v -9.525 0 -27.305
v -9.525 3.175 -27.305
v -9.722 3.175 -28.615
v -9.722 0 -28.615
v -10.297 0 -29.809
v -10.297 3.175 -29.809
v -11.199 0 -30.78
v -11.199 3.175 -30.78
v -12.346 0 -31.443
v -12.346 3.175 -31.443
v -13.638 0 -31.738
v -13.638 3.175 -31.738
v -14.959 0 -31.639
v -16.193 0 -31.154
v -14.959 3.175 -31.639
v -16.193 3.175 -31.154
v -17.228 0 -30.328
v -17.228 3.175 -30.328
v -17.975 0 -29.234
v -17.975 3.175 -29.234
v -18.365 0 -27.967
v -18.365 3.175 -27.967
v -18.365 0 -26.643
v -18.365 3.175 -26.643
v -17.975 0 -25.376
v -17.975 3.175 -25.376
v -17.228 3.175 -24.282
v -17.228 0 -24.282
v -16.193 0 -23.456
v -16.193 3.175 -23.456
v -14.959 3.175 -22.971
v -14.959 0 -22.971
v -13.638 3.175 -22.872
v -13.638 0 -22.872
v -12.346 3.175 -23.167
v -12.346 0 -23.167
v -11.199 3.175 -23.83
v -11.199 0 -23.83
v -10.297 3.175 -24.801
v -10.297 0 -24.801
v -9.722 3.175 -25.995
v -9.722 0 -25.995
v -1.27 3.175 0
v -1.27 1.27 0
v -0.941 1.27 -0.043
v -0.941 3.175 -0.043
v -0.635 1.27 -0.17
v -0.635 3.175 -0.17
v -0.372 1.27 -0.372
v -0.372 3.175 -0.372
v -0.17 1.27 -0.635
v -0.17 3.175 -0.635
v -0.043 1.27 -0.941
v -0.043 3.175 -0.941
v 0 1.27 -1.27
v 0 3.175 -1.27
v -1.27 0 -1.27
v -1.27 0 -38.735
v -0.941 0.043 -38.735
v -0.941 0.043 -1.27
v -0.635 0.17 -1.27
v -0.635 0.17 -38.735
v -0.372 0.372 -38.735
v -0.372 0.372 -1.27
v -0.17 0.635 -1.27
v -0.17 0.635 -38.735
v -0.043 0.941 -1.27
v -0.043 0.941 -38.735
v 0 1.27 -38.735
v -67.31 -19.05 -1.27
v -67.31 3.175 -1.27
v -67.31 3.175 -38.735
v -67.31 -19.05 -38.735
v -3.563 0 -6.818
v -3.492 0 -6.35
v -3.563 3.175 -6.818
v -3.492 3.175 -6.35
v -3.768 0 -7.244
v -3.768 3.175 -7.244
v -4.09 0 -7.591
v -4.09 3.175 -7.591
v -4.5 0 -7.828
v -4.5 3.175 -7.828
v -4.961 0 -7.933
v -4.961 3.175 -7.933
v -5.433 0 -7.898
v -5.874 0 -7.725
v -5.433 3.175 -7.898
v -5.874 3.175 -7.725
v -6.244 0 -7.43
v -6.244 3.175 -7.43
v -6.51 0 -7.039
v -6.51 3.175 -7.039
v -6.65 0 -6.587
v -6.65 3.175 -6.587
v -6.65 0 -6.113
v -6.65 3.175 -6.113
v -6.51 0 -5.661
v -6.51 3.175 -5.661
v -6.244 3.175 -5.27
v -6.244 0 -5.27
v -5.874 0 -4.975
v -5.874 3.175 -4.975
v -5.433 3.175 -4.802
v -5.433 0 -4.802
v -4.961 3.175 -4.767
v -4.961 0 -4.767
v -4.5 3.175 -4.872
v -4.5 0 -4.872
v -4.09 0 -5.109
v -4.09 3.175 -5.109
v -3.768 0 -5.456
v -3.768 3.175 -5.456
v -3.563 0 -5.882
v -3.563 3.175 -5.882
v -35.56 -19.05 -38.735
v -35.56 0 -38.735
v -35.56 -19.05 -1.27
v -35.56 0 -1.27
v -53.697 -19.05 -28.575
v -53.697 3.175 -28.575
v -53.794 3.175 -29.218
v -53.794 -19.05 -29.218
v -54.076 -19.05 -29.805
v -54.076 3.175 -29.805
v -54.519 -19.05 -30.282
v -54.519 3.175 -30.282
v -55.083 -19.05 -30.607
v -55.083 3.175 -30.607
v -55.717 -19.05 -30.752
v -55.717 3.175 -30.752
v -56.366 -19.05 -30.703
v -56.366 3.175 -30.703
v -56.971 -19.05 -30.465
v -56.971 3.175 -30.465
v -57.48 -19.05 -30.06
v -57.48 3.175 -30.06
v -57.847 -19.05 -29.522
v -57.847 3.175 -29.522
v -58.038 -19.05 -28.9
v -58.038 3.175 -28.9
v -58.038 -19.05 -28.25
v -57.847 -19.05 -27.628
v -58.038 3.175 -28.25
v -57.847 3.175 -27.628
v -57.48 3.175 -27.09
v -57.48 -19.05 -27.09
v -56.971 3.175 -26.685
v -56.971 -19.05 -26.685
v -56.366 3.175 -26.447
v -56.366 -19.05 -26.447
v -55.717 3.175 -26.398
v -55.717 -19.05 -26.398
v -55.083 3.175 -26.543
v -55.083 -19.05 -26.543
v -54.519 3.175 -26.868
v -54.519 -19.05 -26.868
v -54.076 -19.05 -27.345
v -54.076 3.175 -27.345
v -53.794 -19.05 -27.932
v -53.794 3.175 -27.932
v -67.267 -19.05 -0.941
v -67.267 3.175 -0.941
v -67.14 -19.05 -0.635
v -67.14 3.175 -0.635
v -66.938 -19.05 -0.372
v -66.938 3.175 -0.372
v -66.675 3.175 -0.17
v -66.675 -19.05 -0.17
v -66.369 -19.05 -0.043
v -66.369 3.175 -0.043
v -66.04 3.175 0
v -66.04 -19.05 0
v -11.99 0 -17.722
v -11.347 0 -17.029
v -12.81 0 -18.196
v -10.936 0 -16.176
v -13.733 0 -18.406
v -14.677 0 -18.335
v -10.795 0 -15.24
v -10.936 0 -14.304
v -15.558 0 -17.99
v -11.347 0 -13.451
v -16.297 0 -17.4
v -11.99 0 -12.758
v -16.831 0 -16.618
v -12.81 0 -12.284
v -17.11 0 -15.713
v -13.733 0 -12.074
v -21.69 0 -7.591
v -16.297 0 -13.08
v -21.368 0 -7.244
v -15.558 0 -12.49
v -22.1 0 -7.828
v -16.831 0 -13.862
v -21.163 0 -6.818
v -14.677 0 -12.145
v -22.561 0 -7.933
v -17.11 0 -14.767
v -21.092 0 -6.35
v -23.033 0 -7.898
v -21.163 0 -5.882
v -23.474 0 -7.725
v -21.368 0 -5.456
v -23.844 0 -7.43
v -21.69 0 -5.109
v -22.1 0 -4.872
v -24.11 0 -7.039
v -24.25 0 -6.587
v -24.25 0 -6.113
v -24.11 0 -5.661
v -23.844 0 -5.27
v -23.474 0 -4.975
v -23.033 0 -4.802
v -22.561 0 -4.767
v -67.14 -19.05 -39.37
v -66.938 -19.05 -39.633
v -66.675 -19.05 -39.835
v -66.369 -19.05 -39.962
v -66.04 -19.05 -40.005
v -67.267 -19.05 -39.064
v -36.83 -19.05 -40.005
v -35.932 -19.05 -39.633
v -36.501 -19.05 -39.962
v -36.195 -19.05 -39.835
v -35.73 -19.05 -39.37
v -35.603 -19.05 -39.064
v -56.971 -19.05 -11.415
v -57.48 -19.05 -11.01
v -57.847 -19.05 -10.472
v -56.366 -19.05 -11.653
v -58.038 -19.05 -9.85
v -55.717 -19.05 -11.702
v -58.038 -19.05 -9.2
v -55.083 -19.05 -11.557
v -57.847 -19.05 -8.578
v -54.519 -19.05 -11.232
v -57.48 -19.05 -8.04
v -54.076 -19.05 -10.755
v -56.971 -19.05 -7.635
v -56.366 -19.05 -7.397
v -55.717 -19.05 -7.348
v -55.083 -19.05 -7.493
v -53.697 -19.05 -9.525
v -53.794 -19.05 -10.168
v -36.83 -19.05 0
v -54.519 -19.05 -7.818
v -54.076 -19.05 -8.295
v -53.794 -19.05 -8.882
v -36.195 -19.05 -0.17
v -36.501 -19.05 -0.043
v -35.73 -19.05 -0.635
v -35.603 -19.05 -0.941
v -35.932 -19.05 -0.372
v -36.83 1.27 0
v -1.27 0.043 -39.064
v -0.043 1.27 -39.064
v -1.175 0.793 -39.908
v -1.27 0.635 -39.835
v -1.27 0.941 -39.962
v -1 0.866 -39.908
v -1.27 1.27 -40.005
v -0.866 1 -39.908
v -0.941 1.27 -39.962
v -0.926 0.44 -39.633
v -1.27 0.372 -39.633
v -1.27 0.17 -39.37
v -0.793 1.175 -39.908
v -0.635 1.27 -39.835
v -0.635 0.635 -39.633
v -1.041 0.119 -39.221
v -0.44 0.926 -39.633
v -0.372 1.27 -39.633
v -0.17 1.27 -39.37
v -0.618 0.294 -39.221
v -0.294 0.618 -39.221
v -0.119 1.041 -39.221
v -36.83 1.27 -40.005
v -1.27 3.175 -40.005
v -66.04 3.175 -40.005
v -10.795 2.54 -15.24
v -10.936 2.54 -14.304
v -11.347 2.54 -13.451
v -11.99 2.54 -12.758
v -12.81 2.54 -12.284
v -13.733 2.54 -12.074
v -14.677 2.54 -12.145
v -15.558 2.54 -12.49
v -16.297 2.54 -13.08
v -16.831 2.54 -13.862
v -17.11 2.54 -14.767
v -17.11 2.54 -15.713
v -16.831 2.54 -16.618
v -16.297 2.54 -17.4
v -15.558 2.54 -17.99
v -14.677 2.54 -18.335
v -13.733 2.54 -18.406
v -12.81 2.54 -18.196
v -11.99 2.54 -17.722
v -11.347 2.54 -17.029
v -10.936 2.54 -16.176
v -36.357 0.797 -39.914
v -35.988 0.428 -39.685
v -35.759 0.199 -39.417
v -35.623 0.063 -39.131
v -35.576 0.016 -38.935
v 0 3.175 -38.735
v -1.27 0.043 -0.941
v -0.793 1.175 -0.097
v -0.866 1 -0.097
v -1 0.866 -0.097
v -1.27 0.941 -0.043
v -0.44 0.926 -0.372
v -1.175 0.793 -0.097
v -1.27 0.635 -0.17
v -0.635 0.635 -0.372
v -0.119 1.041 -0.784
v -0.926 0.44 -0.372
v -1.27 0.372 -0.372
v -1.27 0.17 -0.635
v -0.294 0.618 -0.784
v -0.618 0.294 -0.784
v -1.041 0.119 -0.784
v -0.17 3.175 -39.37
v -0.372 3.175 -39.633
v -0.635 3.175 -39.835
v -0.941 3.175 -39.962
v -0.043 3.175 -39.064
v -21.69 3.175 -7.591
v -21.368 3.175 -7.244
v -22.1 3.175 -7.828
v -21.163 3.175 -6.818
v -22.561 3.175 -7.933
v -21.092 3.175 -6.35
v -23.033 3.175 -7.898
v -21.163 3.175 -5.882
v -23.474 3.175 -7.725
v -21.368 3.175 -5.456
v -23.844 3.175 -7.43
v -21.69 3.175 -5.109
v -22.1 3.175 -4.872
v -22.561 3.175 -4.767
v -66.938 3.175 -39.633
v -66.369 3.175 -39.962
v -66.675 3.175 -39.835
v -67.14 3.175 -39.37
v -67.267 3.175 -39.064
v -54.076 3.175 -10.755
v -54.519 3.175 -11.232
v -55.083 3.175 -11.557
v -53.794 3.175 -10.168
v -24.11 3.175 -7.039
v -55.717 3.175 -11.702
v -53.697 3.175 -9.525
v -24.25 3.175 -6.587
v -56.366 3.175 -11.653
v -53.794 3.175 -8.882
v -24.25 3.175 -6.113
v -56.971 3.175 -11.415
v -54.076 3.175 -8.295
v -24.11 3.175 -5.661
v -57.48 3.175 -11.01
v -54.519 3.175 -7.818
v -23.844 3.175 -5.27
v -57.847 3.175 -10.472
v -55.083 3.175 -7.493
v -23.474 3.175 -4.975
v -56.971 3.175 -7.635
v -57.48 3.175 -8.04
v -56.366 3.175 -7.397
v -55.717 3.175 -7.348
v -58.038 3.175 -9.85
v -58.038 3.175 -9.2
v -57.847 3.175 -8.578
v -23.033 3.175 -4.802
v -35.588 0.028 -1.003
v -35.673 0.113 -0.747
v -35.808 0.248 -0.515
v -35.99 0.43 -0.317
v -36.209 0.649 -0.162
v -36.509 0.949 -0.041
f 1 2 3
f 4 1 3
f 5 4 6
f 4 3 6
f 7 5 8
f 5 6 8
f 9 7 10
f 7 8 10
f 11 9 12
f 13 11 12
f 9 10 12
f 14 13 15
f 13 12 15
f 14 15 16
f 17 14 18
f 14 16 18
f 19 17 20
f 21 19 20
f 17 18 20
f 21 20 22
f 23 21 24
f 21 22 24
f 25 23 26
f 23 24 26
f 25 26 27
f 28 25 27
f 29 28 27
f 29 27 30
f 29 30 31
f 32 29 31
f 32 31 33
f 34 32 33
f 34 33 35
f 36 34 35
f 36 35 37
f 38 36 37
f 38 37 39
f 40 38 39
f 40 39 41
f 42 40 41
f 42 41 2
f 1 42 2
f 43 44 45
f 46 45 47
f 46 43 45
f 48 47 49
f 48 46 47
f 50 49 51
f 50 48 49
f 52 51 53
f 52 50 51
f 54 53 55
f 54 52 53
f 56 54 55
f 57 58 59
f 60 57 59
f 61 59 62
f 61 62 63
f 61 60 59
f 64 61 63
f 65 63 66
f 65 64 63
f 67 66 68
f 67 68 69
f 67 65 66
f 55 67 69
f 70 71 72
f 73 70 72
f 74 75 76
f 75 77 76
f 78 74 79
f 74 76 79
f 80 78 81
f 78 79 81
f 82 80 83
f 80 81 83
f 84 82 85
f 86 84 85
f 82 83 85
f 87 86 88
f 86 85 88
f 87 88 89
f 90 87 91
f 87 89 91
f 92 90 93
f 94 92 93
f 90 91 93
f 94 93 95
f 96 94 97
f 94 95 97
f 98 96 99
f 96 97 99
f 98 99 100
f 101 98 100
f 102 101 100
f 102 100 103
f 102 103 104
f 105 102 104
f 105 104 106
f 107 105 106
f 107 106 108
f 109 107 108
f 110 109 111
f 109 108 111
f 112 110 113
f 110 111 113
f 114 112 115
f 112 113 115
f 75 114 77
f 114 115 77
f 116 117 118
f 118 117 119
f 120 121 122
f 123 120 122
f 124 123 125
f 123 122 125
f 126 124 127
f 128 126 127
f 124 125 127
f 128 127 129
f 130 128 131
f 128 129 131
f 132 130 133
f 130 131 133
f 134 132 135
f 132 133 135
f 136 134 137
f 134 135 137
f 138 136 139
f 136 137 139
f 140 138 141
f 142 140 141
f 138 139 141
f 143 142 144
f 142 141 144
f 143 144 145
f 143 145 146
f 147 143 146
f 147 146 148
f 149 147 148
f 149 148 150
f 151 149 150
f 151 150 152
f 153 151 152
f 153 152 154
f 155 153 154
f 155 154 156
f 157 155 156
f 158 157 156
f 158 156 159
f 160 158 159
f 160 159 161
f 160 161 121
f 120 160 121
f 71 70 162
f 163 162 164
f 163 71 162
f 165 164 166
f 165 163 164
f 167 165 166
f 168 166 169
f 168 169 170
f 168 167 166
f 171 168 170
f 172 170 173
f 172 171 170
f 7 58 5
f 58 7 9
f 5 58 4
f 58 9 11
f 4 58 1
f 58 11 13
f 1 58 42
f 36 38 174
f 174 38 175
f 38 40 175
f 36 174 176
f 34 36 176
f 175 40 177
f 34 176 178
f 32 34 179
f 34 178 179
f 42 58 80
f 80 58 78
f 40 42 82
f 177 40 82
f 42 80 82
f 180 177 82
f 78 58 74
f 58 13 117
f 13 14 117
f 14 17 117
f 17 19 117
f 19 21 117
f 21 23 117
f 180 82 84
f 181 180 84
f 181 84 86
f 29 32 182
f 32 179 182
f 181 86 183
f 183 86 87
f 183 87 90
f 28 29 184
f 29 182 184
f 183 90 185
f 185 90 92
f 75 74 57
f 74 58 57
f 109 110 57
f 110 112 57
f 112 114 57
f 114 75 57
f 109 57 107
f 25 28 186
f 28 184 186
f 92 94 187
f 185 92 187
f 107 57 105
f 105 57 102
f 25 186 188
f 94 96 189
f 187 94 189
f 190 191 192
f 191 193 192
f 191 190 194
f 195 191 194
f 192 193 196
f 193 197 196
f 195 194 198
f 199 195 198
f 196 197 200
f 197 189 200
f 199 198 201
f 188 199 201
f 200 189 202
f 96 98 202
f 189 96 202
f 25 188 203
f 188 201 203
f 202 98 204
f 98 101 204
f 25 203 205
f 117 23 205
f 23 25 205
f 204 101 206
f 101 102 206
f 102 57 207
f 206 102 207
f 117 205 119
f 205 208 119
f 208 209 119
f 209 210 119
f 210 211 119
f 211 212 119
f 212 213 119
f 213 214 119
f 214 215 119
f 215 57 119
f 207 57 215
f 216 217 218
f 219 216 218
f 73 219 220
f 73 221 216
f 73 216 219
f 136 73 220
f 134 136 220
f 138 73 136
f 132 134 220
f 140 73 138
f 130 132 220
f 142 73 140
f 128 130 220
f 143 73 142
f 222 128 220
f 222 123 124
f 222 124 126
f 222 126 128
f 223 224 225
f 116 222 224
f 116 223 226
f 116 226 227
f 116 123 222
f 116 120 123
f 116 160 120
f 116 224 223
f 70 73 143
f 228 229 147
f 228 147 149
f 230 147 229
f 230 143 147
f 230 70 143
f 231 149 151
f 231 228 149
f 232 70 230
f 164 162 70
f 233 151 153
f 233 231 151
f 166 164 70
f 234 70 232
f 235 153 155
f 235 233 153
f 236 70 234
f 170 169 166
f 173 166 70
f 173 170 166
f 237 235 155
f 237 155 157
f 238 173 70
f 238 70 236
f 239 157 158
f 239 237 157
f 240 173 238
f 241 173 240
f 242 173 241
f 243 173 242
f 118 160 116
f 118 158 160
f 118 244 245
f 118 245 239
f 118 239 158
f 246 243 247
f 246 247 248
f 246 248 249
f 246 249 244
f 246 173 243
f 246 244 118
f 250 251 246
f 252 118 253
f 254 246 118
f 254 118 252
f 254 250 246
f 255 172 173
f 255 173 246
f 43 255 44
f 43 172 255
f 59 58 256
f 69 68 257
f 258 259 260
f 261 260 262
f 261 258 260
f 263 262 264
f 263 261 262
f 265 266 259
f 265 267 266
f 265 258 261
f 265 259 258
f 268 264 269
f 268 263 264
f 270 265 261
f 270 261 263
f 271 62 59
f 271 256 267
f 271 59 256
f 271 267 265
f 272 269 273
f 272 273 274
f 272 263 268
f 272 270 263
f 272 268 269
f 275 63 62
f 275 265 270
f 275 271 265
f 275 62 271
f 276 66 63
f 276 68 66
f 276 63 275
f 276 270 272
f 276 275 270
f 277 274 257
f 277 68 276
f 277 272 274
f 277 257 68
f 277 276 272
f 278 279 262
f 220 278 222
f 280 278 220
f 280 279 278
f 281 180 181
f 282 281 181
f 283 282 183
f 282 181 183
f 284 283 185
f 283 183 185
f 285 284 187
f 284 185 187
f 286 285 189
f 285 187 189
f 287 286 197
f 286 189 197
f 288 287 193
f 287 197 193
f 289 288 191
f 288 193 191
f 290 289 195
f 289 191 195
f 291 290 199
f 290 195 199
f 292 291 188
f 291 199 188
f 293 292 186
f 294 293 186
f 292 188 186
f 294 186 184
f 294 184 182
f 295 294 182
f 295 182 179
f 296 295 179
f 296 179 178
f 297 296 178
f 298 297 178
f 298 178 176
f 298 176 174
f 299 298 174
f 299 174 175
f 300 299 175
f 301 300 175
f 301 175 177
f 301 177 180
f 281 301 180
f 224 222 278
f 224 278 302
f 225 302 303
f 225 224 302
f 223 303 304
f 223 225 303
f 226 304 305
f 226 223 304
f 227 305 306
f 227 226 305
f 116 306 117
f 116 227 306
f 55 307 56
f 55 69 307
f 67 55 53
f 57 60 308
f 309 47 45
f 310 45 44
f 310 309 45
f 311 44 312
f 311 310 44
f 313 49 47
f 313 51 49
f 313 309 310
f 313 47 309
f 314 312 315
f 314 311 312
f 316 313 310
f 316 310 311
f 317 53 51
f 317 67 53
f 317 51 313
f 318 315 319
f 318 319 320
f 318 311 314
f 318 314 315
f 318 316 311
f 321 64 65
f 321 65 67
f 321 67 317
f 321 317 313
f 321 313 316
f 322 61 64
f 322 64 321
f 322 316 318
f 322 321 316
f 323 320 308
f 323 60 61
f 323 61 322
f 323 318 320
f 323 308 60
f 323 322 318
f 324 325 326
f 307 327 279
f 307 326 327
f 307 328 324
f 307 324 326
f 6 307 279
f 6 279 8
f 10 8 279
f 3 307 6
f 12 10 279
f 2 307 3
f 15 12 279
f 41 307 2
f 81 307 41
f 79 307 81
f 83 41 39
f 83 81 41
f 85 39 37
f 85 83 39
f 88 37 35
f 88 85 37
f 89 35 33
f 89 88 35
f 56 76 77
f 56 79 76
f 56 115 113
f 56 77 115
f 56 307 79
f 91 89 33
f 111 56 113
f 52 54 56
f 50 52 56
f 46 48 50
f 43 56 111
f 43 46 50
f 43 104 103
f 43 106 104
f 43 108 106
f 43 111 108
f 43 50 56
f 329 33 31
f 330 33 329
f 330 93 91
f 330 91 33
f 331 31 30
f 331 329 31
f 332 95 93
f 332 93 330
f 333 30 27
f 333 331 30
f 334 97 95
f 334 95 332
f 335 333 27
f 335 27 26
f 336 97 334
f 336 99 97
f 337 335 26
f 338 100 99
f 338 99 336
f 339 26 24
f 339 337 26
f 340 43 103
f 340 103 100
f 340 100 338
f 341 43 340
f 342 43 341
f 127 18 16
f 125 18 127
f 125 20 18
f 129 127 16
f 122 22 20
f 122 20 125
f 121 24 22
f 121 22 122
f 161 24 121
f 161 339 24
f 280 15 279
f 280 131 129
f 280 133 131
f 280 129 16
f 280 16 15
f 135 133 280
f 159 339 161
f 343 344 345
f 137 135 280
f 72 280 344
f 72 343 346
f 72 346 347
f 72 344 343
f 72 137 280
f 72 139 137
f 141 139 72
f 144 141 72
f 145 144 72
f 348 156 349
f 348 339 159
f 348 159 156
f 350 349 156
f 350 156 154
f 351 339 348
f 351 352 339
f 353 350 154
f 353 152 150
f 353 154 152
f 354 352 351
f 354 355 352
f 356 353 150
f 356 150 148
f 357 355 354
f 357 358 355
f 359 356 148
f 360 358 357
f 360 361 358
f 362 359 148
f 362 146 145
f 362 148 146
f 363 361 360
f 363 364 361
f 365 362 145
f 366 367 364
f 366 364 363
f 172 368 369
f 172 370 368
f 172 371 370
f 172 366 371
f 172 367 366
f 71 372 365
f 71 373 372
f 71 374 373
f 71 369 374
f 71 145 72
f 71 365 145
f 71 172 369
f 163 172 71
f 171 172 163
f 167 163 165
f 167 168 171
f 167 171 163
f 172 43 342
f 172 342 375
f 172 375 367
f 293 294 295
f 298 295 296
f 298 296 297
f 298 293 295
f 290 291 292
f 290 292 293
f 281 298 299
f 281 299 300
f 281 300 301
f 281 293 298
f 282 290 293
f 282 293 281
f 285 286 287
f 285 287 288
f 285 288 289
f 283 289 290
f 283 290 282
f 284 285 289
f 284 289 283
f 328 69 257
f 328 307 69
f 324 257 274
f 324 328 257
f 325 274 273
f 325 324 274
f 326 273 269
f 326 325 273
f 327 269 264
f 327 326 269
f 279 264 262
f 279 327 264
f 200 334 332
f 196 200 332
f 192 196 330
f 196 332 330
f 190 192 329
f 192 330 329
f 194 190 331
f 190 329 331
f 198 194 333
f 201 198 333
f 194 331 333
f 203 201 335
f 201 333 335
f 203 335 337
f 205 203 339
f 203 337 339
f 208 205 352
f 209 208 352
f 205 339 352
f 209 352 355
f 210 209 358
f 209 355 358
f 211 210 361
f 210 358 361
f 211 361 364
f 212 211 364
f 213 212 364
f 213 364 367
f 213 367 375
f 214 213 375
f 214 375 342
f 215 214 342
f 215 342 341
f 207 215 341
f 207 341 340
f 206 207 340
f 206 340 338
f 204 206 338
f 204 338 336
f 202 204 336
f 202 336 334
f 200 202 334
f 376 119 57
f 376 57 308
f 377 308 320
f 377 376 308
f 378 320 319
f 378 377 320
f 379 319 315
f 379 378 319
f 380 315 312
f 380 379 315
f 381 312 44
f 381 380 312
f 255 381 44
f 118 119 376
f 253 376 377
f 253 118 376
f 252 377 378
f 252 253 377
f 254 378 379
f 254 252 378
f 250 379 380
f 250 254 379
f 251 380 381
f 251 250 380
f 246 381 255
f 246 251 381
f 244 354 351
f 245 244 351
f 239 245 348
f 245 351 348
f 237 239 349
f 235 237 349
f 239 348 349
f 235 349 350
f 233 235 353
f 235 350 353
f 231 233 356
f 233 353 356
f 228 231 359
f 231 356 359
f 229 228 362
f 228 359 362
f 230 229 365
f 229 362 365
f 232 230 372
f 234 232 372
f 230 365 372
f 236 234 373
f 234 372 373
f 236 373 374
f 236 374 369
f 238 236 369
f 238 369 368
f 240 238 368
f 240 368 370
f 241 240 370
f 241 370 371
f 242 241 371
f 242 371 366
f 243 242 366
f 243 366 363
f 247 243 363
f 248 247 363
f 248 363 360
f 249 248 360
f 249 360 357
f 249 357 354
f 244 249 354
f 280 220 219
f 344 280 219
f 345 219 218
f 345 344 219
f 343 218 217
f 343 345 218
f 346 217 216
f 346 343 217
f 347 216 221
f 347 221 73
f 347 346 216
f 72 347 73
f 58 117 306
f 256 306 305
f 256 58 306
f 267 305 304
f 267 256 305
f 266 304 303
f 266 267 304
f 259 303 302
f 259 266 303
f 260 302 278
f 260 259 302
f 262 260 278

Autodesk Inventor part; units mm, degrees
ref_plane "YZ Plane" through (0, 0, 0) normal (1, 0, 0) x (0, 1, 0)
ref_plane "XZ Plane" through (0, 0, 0) normal (0, 1, 0) x (-1, 0, 0)
ref_plane "XY Plane" through (0, 0, 0) normal (0, 0, 1) x (1, 0, 0)
sketch "Sketch1" plane through (0, 0, 0) normal (0, 1, 0) x (-1, 0, 0)
  line L0 (0, 0) -> (67.31, 0)
  line L1 (67.31, 0) -> (67.31, -40.005)
  line L2 (67.31, -40.005) -> (0, -40.005)
  line L3 (0, -40.005) -> (0, 0)
  dimension "d0" = 40.005
  dimension "d1" = 67.31
extrude "Extrusion1" add sketch "Sketch1" along normal blind 3.175
sketch "Sketch2" plane through (0, 3.175, 0) normal (0, 1, 0) x (1, 0, 0)
  circle A0 centre (-13.97, 27.305) radius 4.445
  line L0 (0, 0) -> (0, 40.005) projected
  line L1 (-67.31, 0) -> (0, 0) projected
  line L2 (0, 40.005) -> (-67.31, 40.005) projected
  circle A1 centre (-5.08, 6.35) radius 1.5875
  circle A2 centre (-22.68, 6.35) radius 1.5875
  dimension "d4" = 13.97
  dimension "d28" = 12.7
  dimension "d29" = 8.89
  dimension "d30" = 3.175
  dimension "d31" = 3.175
  dimension "d32" = 5.08
  dimension "d33" = 17.6
  dimension "d34" = 6.35
  dimension "d35" = 6.35
extrude "Extrusion2" cut sketch "Sketch2" against normal blind 6.35
sketch "Sketch3" plane through (0, 0, 0) normal (0, -1, 0) x (1, 0, 0)
  line L0 (0, -40.005) -> (-67.31, -40.005) projected
  line L1 (-67.31, 0) -> (0, 0) projected
  line L2 (-67.31, -40.005) -> (-35.56, -40.005)
  line L3 (-35.56, -40.005) -> (-35.56, 0)
  line L4 (-35.56, 0) -> (-67.31, 0)
  line L5 (-67.31, 0) -> (-67.31, -40.005)
  point P0 (-67.31, 0)
  point P1 (-35.56, -40.005)
  dimension "d8" = 31.75
extrude "Extrusion3" add sketch "Sketch3" along normal blind 19.05
sketch "Sketch6" plane through (0, 3.175, 0) normal (0, 1, 0) x (1, 0, 0)
  circle A0 centre (-55.88, 28.575) radius 2.1828
  circle A1 centre (-55.88, 9.525) radius 2.1828
  line L0 (-67.31, 40.005) -> (-67.31, 0) projected
  line L1 (-67.31, 0) -> (0, 0) projected
  dimension "d19" = 4.3656
  dimension "d20" = 4.3656
  dimension "d21" = 11.43
  dimension "d22" = 11.43
  dimension "d23" = 19.05
  dimension "d24" = 9.525
extrude "Extrusion6" cut sketch "Sketch6" against normal blind 25.4
fillet "Fillet1" radius 1.27 9 edges at (0, 0, -20.0025) (-17.78, 0, 0) (-17.78, 0, -40.005) (-35.56, -9.525, 0) (0, 1.5875, 0) (0, 1.5875, -40.005) (-67.31, -7.9375, -40.005) (-35.56, -9.525, -40.005) (-67.31, -7.9375, 0)
sketch "Sketch7" plane through (0, 0, 0) normal (0, -1, 0) x (1, 0, 0)
  circle A0 centre (-13.97, -15.24) radius 3.175
  line L0 (-1.27, 0) -> (-36.83, 0) projected
  line L1 (0, -38.735) -> (0, -1.27) projected
  point P0 (0, 0)
  dimension "d36" = 6.35
  dimension "d37" = 15.24
  dimension "d38" = 13.97
extrude "Extrusion7" cut sketch "Sketch7" against normal blind 2.54
properties part number "SwerveDriveBracket_C"
